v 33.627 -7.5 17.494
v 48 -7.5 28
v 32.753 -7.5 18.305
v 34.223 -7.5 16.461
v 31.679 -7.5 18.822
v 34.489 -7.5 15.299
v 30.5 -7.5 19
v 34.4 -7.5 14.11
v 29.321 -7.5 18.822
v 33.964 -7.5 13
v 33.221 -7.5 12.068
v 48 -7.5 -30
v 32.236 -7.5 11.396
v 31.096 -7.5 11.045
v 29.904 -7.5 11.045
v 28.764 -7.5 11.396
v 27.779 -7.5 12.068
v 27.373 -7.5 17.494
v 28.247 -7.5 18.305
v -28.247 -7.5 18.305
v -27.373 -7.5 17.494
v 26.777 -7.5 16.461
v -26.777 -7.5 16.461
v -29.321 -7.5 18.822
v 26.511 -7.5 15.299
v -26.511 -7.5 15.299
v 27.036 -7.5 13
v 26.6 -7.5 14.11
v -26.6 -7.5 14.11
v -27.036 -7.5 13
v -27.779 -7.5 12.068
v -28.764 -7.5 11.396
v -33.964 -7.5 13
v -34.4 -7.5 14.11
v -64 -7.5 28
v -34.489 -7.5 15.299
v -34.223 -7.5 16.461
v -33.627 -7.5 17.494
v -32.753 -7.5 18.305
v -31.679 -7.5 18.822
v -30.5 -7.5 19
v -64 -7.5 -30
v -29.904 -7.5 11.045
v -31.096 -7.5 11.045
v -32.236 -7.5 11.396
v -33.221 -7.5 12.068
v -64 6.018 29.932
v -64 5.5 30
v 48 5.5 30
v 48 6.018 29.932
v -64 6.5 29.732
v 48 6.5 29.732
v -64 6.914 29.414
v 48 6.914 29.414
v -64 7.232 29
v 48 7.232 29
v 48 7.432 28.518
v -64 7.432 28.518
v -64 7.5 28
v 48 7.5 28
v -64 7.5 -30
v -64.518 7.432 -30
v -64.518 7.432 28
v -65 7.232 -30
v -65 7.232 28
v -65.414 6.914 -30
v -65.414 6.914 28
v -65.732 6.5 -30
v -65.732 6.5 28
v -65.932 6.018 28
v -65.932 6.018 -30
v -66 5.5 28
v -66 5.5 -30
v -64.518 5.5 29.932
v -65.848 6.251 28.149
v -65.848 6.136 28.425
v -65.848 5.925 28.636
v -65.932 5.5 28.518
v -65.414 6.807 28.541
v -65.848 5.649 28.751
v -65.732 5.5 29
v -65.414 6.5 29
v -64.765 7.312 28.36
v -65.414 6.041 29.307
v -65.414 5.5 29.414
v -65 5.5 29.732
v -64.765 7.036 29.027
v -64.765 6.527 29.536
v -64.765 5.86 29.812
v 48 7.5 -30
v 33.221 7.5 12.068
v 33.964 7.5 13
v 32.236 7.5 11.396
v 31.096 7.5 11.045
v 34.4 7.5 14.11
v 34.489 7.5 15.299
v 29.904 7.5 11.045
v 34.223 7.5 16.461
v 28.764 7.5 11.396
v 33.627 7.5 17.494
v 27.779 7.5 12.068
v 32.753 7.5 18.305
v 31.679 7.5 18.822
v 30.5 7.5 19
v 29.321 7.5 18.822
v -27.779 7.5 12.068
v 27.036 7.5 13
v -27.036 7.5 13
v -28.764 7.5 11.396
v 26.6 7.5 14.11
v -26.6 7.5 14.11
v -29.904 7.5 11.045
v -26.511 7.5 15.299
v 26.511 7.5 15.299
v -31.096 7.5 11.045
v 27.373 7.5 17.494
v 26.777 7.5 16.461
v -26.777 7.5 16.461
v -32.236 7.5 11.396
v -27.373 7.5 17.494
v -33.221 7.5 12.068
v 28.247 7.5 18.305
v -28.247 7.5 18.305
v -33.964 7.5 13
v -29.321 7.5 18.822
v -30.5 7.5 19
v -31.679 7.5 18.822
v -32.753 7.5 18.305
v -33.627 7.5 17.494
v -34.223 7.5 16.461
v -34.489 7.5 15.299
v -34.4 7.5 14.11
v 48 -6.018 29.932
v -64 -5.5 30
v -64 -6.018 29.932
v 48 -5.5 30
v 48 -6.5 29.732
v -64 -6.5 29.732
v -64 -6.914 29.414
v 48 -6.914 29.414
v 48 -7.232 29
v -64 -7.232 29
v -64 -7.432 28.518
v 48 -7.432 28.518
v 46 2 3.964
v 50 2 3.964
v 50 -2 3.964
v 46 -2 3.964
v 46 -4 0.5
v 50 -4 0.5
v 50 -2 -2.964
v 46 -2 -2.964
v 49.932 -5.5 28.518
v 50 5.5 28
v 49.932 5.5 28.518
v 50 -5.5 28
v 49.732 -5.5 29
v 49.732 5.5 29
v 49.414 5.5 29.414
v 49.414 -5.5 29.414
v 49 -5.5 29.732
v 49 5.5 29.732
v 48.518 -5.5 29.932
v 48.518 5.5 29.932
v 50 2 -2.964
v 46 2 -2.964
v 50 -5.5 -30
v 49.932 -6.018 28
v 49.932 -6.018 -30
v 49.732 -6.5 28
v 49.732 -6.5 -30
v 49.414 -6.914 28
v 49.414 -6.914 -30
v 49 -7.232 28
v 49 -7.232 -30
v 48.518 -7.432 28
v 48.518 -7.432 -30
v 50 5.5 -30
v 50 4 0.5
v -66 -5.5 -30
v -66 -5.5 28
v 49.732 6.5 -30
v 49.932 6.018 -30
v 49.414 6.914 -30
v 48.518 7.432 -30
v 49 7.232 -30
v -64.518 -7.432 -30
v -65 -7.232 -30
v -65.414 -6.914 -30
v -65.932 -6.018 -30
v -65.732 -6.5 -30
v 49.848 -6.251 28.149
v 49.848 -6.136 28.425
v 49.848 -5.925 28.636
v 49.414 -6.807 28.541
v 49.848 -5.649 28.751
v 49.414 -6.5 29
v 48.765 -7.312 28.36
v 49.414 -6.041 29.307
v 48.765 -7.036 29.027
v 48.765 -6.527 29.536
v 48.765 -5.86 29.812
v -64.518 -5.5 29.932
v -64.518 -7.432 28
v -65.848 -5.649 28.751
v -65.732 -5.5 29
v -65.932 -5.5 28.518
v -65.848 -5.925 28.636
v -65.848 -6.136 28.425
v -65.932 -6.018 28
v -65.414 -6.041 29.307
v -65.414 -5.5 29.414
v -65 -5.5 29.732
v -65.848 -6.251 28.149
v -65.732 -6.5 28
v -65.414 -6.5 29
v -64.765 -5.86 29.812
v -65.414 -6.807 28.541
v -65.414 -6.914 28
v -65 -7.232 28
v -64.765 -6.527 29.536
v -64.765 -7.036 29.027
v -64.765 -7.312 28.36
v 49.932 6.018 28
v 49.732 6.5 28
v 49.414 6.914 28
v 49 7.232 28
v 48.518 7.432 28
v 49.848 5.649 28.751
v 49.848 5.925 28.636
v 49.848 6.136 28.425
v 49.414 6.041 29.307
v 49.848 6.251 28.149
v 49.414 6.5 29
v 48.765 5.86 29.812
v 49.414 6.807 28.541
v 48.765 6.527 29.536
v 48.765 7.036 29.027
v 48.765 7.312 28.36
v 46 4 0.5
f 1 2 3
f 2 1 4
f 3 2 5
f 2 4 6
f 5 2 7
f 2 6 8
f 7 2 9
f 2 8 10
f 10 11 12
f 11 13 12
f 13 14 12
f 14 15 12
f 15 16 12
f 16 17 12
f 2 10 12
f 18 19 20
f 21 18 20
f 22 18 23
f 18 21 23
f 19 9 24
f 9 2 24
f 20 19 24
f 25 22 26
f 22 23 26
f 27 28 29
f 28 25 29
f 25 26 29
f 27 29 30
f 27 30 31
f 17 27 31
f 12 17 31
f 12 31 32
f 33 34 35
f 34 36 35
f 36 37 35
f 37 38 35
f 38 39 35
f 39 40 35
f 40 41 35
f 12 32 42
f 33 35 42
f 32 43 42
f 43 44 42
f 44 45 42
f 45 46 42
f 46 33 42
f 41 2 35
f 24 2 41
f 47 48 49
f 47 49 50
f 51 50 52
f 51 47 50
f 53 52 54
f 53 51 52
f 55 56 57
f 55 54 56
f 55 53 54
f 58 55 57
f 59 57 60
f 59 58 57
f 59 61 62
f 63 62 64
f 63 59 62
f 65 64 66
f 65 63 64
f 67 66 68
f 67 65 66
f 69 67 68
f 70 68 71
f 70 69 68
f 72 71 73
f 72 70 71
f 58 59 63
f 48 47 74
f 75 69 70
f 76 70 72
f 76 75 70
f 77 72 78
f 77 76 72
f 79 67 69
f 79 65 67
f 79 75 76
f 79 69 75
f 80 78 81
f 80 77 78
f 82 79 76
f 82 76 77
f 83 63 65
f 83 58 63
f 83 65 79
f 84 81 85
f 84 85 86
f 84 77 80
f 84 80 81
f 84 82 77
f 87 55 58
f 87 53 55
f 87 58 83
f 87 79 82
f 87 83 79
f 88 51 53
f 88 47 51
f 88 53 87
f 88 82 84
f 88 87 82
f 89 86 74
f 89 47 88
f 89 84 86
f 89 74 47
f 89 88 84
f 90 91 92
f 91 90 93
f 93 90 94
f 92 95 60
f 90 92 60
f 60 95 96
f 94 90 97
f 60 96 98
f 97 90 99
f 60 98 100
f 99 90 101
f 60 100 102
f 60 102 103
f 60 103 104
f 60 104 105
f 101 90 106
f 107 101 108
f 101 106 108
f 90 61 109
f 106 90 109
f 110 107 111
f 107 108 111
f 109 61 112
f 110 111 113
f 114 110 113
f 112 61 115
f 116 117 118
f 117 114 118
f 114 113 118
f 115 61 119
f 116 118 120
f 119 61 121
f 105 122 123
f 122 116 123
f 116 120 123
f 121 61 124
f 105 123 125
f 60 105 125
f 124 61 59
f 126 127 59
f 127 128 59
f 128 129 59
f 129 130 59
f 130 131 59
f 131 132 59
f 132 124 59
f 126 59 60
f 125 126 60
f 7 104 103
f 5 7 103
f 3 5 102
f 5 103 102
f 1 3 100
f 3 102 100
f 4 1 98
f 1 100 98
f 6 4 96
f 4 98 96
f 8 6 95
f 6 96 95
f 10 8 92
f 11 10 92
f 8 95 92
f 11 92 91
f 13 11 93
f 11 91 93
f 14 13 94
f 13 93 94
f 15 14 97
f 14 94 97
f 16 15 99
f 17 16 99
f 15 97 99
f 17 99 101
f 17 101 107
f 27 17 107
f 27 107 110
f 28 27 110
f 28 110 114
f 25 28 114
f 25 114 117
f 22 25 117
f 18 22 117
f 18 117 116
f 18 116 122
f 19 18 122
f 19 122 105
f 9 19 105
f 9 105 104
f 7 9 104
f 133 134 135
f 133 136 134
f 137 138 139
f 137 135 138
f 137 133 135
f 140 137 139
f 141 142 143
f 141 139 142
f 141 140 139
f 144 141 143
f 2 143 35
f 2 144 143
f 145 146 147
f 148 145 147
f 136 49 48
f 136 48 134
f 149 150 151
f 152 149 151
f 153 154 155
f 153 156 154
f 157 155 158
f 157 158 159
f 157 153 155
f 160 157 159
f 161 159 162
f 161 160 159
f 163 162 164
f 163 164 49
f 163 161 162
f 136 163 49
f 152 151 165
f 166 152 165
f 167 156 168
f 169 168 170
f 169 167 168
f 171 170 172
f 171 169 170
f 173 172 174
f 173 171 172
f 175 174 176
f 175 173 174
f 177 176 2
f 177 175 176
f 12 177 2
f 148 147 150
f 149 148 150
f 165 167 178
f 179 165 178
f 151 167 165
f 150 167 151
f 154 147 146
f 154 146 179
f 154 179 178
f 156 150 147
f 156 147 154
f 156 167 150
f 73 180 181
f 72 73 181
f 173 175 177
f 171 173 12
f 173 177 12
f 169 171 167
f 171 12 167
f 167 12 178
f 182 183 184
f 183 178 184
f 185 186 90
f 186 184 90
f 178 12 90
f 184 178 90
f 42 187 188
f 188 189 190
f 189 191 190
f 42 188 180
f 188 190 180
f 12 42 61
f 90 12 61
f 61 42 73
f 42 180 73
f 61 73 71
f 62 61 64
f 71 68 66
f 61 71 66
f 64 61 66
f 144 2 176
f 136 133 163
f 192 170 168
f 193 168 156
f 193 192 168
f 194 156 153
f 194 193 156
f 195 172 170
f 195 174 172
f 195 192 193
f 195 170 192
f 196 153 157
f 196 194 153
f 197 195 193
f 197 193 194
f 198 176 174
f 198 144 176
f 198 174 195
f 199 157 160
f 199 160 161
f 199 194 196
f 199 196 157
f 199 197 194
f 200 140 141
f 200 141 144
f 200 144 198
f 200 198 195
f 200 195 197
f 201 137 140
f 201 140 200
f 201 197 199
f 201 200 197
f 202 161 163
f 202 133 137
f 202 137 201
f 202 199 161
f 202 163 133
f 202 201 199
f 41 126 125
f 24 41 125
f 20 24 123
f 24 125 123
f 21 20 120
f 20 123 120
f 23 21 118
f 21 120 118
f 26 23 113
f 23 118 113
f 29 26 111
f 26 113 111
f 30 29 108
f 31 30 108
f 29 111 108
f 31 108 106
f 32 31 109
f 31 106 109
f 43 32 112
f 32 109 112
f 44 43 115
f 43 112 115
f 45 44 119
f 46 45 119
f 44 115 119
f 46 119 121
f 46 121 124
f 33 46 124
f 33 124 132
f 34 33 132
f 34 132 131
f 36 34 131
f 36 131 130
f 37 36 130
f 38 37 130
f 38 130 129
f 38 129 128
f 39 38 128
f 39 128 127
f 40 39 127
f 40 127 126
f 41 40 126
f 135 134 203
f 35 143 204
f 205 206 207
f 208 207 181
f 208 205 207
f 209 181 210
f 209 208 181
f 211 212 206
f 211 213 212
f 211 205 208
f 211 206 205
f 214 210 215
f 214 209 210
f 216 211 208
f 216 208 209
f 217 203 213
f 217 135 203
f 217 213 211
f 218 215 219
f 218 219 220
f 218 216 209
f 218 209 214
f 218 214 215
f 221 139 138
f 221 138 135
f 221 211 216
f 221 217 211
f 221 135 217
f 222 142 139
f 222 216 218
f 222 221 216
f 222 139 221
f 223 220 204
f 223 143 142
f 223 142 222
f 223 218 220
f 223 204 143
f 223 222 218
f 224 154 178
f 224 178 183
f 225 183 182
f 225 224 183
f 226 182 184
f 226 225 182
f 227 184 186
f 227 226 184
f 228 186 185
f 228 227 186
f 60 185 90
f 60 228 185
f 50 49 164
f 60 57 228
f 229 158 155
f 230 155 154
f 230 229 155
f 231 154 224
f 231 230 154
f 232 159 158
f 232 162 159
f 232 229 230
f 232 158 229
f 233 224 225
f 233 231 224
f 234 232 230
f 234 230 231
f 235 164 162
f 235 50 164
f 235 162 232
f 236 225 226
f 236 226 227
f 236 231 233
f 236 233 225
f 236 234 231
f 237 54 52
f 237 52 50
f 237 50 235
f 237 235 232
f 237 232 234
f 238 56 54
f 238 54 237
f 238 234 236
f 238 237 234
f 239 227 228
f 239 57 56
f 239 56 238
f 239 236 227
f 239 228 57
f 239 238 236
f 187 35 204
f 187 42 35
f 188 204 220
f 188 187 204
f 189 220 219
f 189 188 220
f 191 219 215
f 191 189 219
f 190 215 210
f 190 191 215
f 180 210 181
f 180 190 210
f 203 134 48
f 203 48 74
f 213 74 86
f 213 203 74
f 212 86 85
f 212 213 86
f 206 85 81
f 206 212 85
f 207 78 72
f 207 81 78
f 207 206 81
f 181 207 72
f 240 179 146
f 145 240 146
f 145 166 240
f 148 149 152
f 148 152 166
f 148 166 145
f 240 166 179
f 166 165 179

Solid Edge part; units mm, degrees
sketch "Sketch1" plane through (0, 0, 0) normal (1, 0, 0) x (0, 1, 0)
  line L0 (7.5, 30) -> (-7.5, 30)
  line L1 (-7.5, 30) -> (-7.5, -30)
  line L2 (-7.5, -30) -> (7.5, -30)
  line L3 (7.5, -30) -> (7.5, 30)
extrude "largo" add sketch "Sketch1" along normal mid plane 100
hole "Hole1" at (30.5, 7.5, 15) direction (0, -1, 0) diameter 8 end up to next
hole "Hole2" at (-30.5, 7.5, 15) direction (0, -1, 0) diameter 8 end up to next
sketch "Sketch2" plane through (50, -1, -1) normal (1, 0, 0) x (0, 1, 0)
  line L0 (3, 4.9641) -> (-1, 4.9641)
  line L1 (-1, 4.9641) -> (-3, 1.5)
  line L2 (-3, 1.5) -> (-1, -1.9641)
  line L3 (-1, -1.9641) -> (3, -1.9641)
  line L4 (3, -1.9641) -> (5, 1.5)
  line L5 (5, 1.5) -> (3, 4.9641)
extrude "Cutout1" cut sketch "Sketch2" against normal blind 4
sketch "Sketch3" plane through (-50, 0, 0) normal (-1, 0, 0) x (0, -1, 0)
  line L0 (-7.5, -30) -> (-7.5, 30)
  line L1 (-7.5, 30) -> (7.5, 30)
  line L2 (7.5, 30) -> (7.5, -30)
  line L3 (7.5, -30) -> (-7.5, -30)
extrude "ProtrusiónExtruida_5" add sketch "Sketch3" along normal blind 16
fillet "Round1" radius 2 8 edges at (-8, 7.5, 30) (-8, -7.5, 30) (50, 7.5, 0) (50, 0, 30) (-66, -7.5, 0) (-66, 7.5, 0) (-66, 0, 30) (50, -7.5, 0)
